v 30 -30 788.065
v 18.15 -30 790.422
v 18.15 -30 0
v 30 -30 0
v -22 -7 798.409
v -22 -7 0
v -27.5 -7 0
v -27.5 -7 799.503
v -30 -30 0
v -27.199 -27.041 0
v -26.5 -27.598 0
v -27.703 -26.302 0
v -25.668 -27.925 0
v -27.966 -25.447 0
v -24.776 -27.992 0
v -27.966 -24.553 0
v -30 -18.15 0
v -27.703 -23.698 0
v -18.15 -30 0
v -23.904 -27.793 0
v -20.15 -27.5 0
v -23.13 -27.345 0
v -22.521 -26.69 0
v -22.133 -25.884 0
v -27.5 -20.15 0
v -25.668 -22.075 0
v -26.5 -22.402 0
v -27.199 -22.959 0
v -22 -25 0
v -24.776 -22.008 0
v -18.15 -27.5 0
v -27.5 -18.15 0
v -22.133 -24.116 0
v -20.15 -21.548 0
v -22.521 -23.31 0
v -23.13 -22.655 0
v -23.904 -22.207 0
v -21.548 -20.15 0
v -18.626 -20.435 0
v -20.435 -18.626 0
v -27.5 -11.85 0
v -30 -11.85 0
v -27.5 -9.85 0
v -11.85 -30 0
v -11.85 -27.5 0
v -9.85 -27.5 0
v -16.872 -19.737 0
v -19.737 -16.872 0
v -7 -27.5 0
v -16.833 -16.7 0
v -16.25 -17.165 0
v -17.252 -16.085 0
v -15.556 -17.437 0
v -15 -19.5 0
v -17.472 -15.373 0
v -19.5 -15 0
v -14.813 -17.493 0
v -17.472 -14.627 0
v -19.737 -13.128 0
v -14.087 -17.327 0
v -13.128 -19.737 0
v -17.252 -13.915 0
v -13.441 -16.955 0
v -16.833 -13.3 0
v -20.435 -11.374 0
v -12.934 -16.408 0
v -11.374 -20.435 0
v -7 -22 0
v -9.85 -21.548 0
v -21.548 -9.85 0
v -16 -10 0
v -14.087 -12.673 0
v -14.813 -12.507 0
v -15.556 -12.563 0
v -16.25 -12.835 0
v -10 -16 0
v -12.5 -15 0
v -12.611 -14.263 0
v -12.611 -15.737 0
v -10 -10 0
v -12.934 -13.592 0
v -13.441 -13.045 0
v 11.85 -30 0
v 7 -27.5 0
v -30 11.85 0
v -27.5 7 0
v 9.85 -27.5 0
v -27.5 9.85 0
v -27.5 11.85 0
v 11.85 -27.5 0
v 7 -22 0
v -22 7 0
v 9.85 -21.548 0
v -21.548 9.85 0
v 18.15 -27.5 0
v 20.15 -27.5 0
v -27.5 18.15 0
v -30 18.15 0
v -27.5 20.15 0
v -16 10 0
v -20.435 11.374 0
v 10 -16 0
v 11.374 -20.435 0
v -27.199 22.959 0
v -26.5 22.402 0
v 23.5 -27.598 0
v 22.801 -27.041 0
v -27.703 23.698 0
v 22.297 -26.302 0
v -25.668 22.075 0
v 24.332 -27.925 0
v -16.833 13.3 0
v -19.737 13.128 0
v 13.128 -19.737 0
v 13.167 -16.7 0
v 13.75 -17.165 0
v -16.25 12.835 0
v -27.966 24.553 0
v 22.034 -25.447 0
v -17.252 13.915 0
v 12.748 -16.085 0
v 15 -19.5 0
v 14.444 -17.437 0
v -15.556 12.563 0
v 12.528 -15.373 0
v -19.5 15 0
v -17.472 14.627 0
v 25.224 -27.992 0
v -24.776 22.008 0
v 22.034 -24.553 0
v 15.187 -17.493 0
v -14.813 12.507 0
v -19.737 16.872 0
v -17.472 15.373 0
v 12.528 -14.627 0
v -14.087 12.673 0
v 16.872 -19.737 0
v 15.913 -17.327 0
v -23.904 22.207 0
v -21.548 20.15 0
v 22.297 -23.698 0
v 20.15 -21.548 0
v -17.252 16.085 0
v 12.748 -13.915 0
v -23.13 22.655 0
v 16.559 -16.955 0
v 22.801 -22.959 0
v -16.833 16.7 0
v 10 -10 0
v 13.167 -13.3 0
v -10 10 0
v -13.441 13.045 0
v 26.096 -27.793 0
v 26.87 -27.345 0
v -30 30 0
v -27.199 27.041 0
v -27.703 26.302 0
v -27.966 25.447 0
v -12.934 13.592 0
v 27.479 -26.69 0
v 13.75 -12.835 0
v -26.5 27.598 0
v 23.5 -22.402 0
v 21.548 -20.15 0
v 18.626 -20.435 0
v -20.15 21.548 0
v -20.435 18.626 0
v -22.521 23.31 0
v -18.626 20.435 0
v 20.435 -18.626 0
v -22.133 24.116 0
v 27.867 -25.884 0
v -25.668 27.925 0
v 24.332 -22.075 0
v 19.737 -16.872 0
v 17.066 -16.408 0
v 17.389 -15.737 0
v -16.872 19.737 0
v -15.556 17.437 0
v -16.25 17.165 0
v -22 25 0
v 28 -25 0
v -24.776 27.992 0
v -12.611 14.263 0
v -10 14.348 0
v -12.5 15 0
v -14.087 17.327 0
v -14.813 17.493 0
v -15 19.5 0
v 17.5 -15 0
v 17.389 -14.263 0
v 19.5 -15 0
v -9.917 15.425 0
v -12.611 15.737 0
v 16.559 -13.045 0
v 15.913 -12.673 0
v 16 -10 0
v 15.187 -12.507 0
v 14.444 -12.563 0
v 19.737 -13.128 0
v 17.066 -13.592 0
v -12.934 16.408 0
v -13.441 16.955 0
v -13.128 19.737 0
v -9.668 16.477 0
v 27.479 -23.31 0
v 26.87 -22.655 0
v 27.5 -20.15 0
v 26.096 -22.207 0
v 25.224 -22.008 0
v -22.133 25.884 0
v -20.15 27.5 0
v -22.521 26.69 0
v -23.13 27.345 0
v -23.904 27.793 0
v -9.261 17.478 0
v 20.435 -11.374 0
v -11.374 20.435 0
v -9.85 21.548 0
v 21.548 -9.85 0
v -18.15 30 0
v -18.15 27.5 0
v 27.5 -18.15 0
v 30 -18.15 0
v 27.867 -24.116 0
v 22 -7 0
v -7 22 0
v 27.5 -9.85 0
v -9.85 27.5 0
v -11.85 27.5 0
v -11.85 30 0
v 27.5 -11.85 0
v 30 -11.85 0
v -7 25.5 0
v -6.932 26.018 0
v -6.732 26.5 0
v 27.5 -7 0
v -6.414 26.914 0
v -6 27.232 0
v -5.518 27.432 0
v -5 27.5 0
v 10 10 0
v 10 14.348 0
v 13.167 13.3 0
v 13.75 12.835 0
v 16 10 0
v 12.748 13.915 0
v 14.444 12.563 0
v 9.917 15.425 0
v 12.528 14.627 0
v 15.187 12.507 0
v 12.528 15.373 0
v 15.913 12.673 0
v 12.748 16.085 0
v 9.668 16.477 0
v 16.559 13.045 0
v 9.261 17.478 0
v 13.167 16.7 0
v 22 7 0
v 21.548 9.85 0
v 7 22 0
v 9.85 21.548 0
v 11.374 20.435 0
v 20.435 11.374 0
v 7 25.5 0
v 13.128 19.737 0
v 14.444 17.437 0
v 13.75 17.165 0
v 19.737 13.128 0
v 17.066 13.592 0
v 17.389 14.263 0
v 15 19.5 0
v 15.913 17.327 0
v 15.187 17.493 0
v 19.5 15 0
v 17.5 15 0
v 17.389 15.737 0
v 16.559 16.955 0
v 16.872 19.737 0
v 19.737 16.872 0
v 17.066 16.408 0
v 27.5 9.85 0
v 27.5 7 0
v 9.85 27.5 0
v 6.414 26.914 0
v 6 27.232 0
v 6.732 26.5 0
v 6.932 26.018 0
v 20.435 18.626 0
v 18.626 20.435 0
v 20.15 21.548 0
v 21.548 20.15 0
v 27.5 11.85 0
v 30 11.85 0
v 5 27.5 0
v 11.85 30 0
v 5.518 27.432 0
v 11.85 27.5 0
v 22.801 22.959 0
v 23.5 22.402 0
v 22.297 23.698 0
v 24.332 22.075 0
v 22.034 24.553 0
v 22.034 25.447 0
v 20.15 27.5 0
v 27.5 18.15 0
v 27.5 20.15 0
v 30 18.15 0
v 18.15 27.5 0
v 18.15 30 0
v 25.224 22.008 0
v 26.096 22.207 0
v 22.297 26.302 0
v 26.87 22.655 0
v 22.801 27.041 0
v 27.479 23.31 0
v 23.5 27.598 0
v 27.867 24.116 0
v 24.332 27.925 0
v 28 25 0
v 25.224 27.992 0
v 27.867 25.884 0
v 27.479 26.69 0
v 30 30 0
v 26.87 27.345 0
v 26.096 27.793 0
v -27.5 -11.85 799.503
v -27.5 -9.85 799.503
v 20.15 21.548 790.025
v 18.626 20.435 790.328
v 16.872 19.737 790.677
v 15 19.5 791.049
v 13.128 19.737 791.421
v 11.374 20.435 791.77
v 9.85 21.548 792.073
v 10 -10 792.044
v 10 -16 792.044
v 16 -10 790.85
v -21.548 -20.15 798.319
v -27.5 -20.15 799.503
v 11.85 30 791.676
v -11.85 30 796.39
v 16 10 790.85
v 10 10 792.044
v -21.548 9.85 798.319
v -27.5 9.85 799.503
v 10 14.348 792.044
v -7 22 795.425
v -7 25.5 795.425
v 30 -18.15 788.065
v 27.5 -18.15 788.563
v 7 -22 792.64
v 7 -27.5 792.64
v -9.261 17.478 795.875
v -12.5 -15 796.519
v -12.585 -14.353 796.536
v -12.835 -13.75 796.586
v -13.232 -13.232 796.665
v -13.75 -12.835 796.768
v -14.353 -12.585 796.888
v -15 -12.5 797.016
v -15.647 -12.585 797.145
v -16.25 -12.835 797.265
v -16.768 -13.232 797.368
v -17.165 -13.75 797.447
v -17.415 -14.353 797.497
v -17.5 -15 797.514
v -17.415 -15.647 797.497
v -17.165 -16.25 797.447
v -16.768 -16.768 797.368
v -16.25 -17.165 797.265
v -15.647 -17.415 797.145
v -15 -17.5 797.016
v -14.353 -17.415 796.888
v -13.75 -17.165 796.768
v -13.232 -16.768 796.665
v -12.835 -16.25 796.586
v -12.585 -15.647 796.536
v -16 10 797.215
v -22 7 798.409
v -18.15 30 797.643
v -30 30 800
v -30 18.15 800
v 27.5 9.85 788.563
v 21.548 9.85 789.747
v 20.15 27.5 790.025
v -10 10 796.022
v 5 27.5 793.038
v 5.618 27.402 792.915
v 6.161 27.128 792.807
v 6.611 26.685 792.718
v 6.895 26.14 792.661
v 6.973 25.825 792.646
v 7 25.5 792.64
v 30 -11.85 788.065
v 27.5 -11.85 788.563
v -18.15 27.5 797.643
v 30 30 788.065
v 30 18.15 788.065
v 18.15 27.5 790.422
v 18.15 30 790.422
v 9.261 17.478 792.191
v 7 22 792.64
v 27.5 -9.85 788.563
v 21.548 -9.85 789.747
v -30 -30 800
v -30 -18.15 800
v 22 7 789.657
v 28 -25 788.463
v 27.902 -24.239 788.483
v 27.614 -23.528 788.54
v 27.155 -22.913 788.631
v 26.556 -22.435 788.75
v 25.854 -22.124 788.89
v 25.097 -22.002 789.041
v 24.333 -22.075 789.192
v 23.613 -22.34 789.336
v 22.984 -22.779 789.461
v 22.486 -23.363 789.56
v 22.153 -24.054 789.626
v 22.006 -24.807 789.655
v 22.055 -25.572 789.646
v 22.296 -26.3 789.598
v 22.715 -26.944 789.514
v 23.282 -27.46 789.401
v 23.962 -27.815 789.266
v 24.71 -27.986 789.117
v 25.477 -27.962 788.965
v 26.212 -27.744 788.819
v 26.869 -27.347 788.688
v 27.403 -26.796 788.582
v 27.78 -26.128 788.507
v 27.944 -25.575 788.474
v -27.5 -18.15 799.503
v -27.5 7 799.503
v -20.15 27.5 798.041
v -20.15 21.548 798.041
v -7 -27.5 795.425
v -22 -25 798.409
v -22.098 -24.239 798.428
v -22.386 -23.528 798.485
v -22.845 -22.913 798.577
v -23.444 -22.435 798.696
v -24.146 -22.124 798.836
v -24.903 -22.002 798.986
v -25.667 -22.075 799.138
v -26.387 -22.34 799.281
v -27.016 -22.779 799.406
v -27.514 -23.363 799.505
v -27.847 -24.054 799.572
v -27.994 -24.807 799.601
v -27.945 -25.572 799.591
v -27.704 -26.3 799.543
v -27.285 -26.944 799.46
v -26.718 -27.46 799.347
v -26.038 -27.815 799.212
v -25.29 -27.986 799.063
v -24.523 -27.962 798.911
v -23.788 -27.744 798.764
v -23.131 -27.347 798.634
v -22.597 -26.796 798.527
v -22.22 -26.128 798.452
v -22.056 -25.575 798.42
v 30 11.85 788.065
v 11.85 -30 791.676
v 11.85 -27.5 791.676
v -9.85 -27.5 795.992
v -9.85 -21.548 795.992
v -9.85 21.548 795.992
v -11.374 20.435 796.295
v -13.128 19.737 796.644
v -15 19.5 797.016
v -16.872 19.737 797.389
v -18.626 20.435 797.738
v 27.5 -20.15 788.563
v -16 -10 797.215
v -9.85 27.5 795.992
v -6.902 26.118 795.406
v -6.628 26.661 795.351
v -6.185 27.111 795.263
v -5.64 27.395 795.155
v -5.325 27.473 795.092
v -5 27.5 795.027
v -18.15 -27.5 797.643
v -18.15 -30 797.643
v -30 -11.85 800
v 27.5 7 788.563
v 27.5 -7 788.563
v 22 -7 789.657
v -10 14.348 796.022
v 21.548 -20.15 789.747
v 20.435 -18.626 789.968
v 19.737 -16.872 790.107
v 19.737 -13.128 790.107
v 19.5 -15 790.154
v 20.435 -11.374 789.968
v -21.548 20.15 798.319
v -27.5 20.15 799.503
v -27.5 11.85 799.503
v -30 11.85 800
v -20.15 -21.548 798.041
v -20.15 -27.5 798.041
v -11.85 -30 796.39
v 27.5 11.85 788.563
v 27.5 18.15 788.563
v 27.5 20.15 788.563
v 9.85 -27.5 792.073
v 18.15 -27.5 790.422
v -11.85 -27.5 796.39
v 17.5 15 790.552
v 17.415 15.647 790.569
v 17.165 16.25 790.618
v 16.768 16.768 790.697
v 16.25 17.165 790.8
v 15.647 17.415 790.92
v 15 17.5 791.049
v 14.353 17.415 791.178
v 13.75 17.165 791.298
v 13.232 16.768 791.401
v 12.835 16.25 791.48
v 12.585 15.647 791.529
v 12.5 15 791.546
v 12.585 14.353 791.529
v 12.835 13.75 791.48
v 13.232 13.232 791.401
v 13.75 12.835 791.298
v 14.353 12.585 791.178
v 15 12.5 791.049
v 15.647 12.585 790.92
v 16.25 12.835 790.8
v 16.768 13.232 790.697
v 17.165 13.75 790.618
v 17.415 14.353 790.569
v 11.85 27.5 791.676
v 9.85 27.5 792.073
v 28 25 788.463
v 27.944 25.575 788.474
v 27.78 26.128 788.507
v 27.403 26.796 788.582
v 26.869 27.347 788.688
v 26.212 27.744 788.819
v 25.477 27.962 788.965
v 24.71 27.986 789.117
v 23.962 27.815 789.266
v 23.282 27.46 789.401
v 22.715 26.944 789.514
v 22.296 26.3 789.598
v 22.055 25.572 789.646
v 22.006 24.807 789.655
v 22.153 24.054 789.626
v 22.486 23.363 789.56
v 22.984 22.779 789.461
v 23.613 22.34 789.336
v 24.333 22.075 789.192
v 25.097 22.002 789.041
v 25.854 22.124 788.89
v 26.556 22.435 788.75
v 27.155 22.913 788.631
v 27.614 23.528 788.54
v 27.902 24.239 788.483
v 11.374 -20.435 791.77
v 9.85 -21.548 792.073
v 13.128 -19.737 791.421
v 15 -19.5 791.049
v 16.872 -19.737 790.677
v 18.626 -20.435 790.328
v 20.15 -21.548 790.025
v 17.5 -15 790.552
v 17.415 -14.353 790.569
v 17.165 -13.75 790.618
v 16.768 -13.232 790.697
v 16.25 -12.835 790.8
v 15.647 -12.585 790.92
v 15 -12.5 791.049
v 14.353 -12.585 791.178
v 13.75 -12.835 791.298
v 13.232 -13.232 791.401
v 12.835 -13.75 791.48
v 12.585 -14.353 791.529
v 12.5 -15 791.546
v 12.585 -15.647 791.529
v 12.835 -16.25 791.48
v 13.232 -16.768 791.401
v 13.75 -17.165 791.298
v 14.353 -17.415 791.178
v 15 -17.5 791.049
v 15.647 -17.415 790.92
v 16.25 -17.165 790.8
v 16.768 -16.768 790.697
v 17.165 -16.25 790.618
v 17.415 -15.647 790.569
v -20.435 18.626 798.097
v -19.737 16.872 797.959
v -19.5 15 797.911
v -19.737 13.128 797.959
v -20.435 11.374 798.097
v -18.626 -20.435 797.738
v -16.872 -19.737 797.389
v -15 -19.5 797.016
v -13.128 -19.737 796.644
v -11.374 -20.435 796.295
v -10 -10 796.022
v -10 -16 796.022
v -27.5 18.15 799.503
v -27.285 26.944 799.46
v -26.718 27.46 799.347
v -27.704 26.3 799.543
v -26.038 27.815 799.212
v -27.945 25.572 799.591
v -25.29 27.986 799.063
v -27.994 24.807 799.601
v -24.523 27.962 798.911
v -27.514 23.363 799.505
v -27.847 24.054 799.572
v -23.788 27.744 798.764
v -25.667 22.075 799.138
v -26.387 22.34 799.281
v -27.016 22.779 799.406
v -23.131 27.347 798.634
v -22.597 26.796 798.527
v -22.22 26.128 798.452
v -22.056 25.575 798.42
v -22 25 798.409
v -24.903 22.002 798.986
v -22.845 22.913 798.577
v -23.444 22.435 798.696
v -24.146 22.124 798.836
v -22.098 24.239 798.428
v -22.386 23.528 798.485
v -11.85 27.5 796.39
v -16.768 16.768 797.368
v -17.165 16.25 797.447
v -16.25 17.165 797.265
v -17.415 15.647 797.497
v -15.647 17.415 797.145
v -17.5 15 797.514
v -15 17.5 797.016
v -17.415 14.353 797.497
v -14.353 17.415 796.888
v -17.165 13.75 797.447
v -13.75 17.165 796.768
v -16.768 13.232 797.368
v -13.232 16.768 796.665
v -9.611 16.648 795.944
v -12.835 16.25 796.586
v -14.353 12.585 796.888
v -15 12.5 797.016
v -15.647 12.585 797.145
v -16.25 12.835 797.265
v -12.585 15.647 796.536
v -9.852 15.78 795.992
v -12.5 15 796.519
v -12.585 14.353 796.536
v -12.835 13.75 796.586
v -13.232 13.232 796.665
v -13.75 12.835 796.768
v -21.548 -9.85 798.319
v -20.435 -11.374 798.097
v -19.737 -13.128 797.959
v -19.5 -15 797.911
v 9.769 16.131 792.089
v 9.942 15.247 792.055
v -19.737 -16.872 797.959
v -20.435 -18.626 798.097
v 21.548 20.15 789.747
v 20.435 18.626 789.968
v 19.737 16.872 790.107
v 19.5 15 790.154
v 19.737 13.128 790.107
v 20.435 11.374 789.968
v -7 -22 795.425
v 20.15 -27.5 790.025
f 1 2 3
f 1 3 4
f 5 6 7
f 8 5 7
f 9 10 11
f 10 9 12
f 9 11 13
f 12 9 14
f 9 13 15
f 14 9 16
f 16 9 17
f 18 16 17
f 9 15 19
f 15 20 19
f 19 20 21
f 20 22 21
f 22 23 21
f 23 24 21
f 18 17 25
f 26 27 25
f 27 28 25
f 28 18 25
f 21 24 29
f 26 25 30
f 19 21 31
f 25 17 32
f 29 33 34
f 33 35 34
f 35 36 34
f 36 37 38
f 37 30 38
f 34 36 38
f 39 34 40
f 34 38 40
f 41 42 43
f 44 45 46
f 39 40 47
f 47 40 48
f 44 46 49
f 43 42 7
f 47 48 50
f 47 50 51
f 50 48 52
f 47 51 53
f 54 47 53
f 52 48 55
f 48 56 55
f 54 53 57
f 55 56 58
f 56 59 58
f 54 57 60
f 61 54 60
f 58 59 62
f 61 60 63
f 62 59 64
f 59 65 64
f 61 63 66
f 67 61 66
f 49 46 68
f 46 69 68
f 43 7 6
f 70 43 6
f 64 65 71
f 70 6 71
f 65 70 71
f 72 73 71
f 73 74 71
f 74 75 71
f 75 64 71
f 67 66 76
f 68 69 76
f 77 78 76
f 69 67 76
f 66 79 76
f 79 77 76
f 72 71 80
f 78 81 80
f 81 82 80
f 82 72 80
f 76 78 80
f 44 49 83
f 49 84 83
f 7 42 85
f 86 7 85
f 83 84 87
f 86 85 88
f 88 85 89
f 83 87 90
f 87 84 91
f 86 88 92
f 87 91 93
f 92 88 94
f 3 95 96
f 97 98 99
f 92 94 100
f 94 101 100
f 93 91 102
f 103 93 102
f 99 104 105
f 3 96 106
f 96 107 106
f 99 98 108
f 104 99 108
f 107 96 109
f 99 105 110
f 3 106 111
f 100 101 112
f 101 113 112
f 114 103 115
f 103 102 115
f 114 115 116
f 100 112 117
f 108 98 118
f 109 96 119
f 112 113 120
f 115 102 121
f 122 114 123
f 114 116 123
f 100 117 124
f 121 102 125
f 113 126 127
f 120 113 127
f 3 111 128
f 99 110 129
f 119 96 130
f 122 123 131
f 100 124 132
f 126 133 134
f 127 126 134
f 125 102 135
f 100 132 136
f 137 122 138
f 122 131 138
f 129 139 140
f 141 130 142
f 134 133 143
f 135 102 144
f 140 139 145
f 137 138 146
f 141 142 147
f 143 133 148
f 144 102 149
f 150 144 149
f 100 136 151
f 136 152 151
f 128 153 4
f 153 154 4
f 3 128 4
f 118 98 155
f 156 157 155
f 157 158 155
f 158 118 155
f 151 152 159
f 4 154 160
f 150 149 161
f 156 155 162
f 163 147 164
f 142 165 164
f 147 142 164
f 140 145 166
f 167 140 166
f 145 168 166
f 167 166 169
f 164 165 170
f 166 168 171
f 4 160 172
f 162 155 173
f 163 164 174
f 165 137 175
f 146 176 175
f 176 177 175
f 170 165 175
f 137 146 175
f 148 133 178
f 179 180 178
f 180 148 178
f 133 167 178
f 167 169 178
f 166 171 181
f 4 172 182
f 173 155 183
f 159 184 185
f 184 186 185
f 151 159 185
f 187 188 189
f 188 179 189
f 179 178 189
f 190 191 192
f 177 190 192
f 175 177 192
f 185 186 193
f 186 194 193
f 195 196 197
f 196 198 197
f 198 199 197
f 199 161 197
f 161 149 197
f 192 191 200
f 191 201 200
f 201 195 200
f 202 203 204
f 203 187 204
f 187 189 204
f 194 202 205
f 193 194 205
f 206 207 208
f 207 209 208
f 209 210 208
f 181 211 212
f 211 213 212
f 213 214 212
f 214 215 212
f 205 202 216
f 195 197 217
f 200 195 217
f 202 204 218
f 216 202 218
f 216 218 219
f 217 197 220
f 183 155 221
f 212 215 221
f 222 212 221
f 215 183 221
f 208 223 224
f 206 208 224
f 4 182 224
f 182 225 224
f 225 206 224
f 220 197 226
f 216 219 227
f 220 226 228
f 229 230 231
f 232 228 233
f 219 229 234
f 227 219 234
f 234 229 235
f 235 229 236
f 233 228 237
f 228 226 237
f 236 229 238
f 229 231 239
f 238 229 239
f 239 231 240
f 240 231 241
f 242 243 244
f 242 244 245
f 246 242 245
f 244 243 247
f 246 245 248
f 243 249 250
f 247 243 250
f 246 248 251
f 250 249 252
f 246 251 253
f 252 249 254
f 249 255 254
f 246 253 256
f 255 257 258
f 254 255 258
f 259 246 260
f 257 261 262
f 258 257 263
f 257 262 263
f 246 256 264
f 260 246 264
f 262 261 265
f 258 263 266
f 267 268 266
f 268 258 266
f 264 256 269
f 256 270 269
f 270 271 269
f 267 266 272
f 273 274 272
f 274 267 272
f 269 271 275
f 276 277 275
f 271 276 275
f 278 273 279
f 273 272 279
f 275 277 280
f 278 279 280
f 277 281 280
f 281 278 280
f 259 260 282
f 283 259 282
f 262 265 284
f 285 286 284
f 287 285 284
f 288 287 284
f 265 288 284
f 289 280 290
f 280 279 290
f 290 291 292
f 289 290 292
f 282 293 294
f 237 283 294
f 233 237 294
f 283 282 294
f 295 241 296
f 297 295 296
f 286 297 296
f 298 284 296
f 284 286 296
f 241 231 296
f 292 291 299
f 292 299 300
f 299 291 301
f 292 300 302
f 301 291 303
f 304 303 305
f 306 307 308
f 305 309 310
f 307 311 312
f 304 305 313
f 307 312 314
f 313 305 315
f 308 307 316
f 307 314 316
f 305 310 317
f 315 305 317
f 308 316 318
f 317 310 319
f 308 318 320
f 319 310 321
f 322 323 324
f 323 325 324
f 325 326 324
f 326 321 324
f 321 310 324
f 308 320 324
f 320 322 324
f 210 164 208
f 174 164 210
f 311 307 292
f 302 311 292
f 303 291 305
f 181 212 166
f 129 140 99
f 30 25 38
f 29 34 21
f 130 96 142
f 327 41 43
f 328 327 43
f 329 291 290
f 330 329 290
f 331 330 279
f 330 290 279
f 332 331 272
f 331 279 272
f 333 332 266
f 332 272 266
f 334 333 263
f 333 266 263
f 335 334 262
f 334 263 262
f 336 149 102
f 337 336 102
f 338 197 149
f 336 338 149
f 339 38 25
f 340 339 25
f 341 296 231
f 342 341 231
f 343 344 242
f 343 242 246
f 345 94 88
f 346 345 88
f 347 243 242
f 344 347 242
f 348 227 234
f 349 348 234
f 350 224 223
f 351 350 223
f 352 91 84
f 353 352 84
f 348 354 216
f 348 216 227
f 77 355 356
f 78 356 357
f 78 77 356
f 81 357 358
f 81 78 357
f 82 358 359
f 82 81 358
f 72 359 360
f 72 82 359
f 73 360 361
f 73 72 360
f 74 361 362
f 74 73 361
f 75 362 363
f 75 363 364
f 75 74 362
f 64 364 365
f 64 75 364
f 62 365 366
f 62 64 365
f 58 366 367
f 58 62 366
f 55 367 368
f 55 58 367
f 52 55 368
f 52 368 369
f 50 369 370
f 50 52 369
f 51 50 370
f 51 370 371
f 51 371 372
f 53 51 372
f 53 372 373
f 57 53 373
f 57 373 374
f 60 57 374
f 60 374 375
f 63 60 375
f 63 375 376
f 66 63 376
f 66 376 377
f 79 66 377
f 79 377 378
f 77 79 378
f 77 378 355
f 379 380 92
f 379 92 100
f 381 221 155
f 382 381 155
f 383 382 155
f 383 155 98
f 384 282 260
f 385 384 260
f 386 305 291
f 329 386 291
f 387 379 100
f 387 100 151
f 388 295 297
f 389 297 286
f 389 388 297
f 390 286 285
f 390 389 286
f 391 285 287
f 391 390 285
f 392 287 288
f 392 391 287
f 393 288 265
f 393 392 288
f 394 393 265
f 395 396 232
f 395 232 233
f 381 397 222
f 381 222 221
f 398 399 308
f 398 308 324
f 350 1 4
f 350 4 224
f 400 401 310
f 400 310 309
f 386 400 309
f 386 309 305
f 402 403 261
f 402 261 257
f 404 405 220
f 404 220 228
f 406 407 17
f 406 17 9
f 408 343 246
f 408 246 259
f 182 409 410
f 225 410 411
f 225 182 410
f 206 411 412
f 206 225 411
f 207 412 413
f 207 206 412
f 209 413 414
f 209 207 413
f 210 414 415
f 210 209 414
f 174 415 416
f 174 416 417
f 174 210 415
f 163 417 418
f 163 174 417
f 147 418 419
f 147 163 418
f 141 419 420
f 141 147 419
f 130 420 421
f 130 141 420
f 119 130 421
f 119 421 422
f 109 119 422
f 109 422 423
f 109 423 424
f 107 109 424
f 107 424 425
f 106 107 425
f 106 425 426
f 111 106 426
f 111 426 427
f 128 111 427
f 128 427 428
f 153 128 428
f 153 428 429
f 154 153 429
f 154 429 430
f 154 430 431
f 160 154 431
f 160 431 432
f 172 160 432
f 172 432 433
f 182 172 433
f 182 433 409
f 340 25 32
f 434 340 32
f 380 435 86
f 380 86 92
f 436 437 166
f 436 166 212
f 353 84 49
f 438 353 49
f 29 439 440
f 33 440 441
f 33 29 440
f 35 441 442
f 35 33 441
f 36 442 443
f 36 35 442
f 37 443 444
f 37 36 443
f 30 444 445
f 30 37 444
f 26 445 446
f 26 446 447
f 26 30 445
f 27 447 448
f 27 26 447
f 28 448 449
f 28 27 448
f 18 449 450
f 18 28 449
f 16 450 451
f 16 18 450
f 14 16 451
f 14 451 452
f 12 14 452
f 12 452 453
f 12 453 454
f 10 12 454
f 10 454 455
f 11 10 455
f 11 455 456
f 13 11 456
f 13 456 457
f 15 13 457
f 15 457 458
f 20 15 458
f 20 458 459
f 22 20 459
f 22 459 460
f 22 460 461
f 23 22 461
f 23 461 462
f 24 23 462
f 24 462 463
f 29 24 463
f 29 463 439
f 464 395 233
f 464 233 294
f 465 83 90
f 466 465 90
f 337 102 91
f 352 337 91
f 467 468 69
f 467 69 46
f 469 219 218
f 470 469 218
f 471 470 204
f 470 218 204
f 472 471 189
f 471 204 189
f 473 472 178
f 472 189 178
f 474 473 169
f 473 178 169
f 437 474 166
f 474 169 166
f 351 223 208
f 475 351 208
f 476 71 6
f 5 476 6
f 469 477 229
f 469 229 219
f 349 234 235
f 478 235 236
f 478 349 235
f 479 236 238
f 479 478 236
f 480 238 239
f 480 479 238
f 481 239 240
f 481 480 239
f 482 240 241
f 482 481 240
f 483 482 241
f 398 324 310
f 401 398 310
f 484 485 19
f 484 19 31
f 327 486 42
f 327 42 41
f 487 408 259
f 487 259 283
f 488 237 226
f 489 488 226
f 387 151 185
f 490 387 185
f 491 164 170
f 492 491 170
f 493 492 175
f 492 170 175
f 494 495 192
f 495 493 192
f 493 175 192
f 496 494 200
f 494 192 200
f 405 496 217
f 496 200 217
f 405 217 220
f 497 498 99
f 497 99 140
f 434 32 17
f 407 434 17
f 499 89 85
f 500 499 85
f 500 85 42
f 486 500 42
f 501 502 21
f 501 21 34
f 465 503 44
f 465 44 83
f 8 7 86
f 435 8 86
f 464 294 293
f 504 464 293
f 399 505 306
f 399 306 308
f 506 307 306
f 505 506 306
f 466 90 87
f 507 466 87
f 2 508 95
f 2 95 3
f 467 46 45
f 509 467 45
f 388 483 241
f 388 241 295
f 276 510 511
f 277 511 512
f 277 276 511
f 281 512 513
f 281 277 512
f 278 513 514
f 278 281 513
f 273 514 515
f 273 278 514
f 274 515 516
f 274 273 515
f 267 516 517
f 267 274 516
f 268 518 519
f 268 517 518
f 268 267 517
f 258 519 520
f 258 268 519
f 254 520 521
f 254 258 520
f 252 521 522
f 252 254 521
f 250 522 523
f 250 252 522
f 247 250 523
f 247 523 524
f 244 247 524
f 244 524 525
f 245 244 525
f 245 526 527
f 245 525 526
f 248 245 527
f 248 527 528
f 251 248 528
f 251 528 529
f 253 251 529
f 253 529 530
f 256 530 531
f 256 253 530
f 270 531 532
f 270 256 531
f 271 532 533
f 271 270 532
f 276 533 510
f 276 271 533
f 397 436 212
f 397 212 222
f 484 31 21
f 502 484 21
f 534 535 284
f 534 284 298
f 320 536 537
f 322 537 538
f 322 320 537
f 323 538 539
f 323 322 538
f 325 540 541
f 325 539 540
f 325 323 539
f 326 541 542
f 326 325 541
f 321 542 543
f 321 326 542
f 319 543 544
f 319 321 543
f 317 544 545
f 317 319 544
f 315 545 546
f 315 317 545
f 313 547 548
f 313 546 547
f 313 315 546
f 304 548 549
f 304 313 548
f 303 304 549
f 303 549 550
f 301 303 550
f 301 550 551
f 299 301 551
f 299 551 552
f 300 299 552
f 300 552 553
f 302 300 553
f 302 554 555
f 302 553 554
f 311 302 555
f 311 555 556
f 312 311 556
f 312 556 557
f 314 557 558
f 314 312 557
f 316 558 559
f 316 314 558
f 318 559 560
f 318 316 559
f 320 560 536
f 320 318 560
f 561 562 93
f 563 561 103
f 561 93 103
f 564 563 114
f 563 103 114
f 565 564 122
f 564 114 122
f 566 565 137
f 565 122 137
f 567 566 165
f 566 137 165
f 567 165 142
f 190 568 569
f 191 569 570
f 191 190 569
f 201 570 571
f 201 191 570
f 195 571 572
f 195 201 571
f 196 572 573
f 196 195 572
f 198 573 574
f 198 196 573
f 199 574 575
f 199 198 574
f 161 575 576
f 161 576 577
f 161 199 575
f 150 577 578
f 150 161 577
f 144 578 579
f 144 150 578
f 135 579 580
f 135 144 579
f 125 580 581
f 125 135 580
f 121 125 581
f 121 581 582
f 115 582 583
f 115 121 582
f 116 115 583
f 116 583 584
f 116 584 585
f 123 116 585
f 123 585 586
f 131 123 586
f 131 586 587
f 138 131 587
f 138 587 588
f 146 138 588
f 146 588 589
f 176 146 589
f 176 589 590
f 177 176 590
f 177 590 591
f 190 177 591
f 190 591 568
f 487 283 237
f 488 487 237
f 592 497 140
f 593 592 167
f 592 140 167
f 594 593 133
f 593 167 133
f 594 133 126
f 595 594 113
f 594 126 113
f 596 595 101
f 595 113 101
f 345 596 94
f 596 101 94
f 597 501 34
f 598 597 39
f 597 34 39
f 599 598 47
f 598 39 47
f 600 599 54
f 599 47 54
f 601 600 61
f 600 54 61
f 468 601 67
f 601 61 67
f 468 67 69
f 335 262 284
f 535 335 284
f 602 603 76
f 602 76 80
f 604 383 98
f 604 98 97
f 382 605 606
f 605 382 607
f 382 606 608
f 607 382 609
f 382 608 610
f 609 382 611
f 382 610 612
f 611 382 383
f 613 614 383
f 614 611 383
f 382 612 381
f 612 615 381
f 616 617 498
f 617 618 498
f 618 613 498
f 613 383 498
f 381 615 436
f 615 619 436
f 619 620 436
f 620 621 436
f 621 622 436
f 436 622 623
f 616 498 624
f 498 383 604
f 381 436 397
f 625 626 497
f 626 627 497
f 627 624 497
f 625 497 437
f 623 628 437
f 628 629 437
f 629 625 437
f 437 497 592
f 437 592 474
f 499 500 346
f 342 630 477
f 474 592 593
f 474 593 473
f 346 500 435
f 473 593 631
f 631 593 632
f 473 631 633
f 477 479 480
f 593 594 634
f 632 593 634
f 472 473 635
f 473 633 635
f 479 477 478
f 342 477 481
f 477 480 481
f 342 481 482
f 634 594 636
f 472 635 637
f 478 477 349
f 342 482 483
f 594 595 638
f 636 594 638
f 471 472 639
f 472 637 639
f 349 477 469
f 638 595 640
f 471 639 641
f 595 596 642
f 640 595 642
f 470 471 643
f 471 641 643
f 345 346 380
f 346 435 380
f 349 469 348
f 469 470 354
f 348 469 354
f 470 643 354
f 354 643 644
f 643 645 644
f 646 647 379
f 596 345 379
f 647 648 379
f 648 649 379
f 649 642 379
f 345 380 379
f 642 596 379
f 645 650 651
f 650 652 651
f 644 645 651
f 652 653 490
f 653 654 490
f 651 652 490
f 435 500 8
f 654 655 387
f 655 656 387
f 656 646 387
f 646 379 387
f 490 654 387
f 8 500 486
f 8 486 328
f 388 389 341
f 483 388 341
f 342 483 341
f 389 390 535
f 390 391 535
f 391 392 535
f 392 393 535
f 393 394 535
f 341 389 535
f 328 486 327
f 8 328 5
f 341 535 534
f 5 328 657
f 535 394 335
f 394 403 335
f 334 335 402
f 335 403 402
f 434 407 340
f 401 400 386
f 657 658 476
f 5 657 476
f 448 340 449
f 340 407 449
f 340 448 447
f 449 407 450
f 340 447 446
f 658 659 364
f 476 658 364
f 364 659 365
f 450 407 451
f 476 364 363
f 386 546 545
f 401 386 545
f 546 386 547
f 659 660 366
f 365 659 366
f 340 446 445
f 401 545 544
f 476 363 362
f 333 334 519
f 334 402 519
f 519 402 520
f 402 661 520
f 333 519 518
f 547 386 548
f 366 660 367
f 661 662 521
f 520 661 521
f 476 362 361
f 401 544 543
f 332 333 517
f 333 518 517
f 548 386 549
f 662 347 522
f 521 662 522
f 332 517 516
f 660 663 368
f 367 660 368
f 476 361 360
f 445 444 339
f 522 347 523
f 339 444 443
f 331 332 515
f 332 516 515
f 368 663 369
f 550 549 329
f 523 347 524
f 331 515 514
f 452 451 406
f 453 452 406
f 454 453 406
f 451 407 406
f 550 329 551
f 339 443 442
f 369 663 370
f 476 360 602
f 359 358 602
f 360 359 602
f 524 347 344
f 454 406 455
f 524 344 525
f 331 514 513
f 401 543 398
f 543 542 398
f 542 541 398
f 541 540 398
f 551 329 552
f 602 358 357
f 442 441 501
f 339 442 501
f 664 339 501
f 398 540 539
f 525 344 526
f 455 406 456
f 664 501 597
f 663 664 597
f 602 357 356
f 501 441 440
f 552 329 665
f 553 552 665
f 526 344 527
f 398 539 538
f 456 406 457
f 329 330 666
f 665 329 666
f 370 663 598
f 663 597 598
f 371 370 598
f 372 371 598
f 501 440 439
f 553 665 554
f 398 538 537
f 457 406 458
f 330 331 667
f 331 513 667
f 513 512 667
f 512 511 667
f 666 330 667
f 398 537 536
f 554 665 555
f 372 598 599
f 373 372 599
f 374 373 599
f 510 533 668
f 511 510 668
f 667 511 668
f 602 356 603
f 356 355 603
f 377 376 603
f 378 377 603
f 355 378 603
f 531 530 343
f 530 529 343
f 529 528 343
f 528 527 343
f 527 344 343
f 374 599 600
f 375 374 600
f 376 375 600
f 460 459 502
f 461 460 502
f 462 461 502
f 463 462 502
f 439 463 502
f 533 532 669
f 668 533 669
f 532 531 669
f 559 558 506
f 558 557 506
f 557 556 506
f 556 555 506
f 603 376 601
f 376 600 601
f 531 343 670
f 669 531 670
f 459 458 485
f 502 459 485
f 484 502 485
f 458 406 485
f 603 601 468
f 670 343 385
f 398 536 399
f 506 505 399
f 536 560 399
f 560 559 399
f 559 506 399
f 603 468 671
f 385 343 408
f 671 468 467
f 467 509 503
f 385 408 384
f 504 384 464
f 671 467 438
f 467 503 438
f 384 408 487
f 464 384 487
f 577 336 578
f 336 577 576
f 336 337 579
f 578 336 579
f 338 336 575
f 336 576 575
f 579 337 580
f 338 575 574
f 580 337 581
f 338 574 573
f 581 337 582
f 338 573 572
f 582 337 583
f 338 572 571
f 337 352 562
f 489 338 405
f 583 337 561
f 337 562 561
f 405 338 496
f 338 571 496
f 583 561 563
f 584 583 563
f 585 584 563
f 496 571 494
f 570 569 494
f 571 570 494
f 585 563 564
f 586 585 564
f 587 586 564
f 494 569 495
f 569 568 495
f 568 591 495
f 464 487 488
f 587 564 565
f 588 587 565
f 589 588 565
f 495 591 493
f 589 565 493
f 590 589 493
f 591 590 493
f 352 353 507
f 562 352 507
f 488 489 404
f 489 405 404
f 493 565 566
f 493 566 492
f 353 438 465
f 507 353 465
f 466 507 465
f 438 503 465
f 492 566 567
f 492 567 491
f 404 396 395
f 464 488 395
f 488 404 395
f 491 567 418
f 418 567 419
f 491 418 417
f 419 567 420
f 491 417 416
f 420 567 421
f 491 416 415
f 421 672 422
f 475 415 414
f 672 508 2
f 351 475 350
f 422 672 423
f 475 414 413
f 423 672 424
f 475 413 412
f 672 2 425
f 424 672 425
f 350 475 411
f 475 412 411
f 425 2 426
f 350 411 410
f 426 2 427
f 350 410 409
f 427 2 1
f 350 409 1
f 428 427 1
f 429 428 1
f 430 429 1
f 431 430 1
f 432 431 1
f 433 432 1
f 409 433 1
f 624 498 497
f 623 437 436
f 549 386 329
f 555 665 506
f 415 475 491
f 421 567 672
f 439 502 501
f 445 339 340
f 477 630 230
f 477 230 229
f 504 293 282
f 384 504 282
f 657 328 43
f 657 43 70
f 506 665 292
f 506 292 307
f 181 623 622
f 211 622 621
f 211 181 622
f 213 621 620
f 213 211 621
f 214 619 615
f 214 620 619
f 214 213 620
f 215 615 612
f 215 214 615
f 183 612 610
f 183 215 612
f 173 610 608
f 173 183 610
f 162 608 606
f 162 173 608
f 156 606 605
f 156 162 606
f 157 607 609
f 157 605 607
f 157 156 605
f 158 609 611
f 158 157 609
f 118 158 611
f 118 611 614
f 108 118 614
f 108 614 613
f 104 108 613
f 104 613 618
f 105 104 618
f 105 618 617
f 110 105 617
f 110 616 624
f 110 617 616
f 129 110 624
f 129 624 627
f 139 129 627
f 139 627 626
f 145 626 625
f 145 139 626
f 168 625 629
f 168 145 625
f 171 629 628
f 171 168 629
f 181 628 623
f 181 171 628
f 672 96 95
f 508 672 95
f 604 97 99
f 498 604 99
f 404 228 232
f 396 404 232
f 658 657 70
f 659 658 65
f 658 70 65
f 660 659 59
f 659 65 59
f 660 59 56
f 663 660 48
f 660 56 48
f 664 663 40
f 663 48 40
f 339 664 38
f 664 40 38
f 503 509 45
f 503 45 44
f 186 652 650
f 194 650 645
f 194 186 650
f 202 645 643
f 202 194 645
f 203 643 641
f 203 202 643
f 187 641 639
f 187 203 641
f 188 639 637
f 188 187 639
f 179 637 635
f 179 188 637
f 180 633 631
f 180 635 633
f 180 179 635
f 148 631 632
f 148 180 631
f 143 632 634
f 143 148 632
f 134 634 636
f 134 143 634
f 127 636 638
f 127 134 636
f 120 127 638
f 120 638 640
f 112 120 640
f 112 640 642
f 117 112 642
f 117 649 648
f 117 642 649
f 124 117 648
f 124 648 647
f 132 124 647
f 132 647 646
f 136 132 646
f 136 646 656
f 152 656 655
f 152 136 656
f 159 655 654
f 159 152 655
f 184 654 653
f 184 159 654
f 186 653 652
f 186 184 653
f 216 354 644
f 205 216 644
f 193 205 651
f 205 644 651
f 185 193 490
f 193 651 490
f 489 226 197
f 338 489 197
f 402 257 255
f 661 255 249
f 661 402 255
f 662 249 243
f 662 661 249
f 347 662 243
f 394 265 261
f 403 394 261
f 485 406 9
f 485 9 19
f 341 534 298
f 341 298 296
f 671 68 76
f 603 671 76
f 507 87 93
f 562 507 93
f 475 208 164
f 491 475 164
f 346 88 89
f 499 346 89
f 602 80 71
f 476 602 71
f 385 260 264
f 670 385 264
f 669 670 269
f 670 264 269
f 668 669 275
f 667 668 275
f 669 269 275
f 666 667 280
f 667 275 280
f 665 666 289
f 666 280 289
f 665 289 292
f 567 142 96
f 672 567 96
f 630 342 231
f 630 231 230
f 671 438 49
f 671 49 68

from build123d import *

# Parameters (mm, degrees)
F0_R          = 3
F0_R_2        = 2.5
F1_DEPTH      = 800
F2_R          = 2
F3_R          = 7
F6_DEPTH      = 30
F6_DEPTH_BACK = 30


# Not quite as in the source:
# - a feature names something its author has since deleted; it is built from what else it names


with BuildPart() as f1:
    # F0 (on Top) → F1 (new body)
    with BuildSketch(Plane.XY):
        with BuildLine():
            Line((18.15, -30), (30, -30))
            Line((30, -30), (30, -18.15))
            Line((30, -18.15), (27.5, -18.15))
            Line((27.5, -18.15), (27.5, -20.15))
            Line((27.5, -20.15), (21.5477069044, -20.15))
            ThreePointArc((21.5477069044, -20.15), (19.5, -15), (21.5477069044, -9.85))
            Line((21.5477069044, -9.85), (27.5, -9.85))
            Line((27.5, -9.85), (27.5, -11.85))
            Line((27.5, -11.85), (30, -11.85))
            Line((30, -11.85), (30, 11.85))
            Line((30, 11.85), (27.5, 11.85))
            Line((27.5, 11.85), (27.5, 9.85))
            Line((27.5, 9.85), (21.5477069044, 9.85))
            ThreePointArc((21.5477069044, 9.85), (19.5, 15), (21.5477069044, 20.15))
            Line((21.5477069044, 20.15), (27.5, 20.15))
            Line((27.5, 20.15), (27.5, 18.15))
            Line((27.5, 18.15), (30, 18.15))
            Line((30, 18.15), (30, 30))
            Line((30, 30), (18.15, 30))
            Line((18.15, 30), (18.15, 27.5))
            Line((18.15, 27.5), (20.15, 27.5))
            Line((20.15, 27.5), (20.15, 21.5477069044))
            ThreePointArc((20.15, 21.5477069044), (15, 19.5), (9.85, 21.5477069044))
            Line((9.85, 21.5477069044), (9.85, 27.5))
            Line((9.85, 27.5), (11.85, 27.5))
            Line((11.85, 27.5), (11.85, 30))
            Line((11.85, 30), (-11.85, 30))
            Line((-11.85, 30), (-11.85, 27.5))
            Line((-11.85, 27.5), (-9.85, 27.5))
            Line((-9.85, 27.5), (-9.85, 21.5477069044))
            ThreePointArc((-9.85, 21.5477069044), (-15, 19.5), (-20.15, 21.5477069044))
            Line((-20.15, 21.5477069044), (-20.15, 27.5))
            Line((-20.15, 27.5), (-18.15, 27.5))
            Line((-18.15, 27.5), (-18.15, 30))
            Line((-18.15, 30), (-30, 30))
            Line((-30, 30), (-30, 18.15))
            Line((-30, 18.15), (-27.5, 18.15))
            Line((-27.5, 18.15), (-27.5, 20.15))
            Line((-27.5, 20.15), (-21.5477069044, 20.15))
            ThreePointArc((-21.5477069044, 20.15), (-19.5, 15), (-21.5477069044, 9.85))
            Line((-21.5477069044, 9.85), (-27.5, 9.85))
            Line((-27.5, 9.85), (-27.5, 11.85))
            Line((-27.5, 11.85), (-30, 11.85))
            Line((-30, 11.85), (-30, -11.85))
            Line((-30, -11.85), (-27.5, -11.85))
            Line((-27.5, -11.85), (-27.5, -9.85))
            Line((-27.5, -9.85), (-21.5477069044, -9.85))
            ThreePointArc((-21.5477069044, -9.85), (-19.5, -15), (-21.5477069044, -20.15))
            Line((-21.5477069044, -20.15), (-27.5, -20.15))
            Line((-27.5, -20.15), (-27.5, -18.15))
            Line((-27.5, -18.15), (-30, -18.15))
            Line((-30, -18.15), (-30, -30))
            Line((-30, -30), (-18.15, -30))
            Line((-18.15, -30), (-18.15, -27.5))
            Line((-18.15, -27.5), (-20.15, -27.5))
            Line((-20.15, -27.5), (-20.15, -21.5477069044))
            ThreePointArc((-20.15, -21.5477069044), (-15, -19.5), (-9.85, -21.5477069044))
            Line((-9.85, -21.5477069044), (-9.85, -27.5))
            Line((-9.85, -27.5), (-11.85, -27.5))
            Line((-11.85, -27.5), (-11.85, -30))
            Line((-11.85, -30), (11.85, -30))
            Line((11.85, -30), (11.85, -27.5))
            Line((11.85, -27.5), (9.85, -27.5))
            Line((9.85, -27.5), (9.85, -21.5477069044))
            ThreePointArc((9.85, -21.5477069044), (15, -19.5), (20.15, -21.5477069044))
            Line((20.15, -21.5477069044), (20.15, -27.5))
            Line((20.15, -27.5), (18.15, -27.5))
            Line((18.15, -27.5), (18.15, -30))
        make_face()
        with Locations((-25, -25)):
            Circle(F0_R, mode=Mode.SUBTRACT)
        with Locations((-15, -15)):
            Circle(F0_R_2, mode=Mode.SUBTRACT)
        with Locations((25, -25)):
            Circle(F0_R, mode=Mode.SUBTRACT)
        with Locations((15, -15)):
            Circle(F0_R_2, mode=Mode.SUBTRACT)
        with Locations((-25, 25)):
            Circle(F0_R, mode=Mode.SUBTRACT)
        with Locations((-15, 15)):
            Circle(F0_R_2, mode=Mode.SUBTRACT)
        Polygon((-7, 22), (-7, 27.5), (0, 27.5), (7, 27.5), (7, 22), (10, 16), (10, 10), (16, 10), (22, 7), (27.5, 7), (27.5, 0), (27.5, -7), (22, -7), (16, -10), (10, -10), (10, -16), (7, -22), (7, -27.5), (0, -27.5), (-7, -27.5), (-7, -22), (-10, -16), (-10, -10), (-16, -10), (-22, -7), (-27.5, -7), (-27.5, 0), (-27.5, 7), (-22, 7), (-16, 10), (-10, 10), (-10, 16), align=None, mode=Mode.SUBTRACT)
        with Locations((15, 15)):
            Circle(F0_R_2, mode=Mode.SUBTRACT)
        with Locations((25, 25)):
            Circle(F0_R, mode=Mode.SUBTRACT)
    extrude(amount=F1_DEPTH)

    # F2
    f2_edges = [f1.edges().sort_by_distance(p)[0] for p in [
        (-7, 27.5, 400),
        (7, 27.5, 400),
    ]]
    fillet(f2_edges, radius=F2_R)

    # F3
    f3_edges = [f1.edges().sort_by_distance(p)[0] for p in [
        (-10, 16, 400),
        (10, 16, 400),
    ]]
    fillet(f3_edges, radius=F3_R)

    # F5 (on Front) → F6 (cut, two sides)
    with BuildSketch(Plane.XZ) as f6_sk:
        Polygon((92.6955789172, 775.5943319306), (113.9419287111, 882.406945313), (-8.7536502061, 906.8126133825), (-30, 800), align=None)
    extrude(amount=F6_DEPTH, mode=Mode.SUBTRACT)
    extrude(f6_sk.sketch, amount=-F6_DEPTH_BACK, mode=Mode.SUBTRACT)


solid = f1.part
